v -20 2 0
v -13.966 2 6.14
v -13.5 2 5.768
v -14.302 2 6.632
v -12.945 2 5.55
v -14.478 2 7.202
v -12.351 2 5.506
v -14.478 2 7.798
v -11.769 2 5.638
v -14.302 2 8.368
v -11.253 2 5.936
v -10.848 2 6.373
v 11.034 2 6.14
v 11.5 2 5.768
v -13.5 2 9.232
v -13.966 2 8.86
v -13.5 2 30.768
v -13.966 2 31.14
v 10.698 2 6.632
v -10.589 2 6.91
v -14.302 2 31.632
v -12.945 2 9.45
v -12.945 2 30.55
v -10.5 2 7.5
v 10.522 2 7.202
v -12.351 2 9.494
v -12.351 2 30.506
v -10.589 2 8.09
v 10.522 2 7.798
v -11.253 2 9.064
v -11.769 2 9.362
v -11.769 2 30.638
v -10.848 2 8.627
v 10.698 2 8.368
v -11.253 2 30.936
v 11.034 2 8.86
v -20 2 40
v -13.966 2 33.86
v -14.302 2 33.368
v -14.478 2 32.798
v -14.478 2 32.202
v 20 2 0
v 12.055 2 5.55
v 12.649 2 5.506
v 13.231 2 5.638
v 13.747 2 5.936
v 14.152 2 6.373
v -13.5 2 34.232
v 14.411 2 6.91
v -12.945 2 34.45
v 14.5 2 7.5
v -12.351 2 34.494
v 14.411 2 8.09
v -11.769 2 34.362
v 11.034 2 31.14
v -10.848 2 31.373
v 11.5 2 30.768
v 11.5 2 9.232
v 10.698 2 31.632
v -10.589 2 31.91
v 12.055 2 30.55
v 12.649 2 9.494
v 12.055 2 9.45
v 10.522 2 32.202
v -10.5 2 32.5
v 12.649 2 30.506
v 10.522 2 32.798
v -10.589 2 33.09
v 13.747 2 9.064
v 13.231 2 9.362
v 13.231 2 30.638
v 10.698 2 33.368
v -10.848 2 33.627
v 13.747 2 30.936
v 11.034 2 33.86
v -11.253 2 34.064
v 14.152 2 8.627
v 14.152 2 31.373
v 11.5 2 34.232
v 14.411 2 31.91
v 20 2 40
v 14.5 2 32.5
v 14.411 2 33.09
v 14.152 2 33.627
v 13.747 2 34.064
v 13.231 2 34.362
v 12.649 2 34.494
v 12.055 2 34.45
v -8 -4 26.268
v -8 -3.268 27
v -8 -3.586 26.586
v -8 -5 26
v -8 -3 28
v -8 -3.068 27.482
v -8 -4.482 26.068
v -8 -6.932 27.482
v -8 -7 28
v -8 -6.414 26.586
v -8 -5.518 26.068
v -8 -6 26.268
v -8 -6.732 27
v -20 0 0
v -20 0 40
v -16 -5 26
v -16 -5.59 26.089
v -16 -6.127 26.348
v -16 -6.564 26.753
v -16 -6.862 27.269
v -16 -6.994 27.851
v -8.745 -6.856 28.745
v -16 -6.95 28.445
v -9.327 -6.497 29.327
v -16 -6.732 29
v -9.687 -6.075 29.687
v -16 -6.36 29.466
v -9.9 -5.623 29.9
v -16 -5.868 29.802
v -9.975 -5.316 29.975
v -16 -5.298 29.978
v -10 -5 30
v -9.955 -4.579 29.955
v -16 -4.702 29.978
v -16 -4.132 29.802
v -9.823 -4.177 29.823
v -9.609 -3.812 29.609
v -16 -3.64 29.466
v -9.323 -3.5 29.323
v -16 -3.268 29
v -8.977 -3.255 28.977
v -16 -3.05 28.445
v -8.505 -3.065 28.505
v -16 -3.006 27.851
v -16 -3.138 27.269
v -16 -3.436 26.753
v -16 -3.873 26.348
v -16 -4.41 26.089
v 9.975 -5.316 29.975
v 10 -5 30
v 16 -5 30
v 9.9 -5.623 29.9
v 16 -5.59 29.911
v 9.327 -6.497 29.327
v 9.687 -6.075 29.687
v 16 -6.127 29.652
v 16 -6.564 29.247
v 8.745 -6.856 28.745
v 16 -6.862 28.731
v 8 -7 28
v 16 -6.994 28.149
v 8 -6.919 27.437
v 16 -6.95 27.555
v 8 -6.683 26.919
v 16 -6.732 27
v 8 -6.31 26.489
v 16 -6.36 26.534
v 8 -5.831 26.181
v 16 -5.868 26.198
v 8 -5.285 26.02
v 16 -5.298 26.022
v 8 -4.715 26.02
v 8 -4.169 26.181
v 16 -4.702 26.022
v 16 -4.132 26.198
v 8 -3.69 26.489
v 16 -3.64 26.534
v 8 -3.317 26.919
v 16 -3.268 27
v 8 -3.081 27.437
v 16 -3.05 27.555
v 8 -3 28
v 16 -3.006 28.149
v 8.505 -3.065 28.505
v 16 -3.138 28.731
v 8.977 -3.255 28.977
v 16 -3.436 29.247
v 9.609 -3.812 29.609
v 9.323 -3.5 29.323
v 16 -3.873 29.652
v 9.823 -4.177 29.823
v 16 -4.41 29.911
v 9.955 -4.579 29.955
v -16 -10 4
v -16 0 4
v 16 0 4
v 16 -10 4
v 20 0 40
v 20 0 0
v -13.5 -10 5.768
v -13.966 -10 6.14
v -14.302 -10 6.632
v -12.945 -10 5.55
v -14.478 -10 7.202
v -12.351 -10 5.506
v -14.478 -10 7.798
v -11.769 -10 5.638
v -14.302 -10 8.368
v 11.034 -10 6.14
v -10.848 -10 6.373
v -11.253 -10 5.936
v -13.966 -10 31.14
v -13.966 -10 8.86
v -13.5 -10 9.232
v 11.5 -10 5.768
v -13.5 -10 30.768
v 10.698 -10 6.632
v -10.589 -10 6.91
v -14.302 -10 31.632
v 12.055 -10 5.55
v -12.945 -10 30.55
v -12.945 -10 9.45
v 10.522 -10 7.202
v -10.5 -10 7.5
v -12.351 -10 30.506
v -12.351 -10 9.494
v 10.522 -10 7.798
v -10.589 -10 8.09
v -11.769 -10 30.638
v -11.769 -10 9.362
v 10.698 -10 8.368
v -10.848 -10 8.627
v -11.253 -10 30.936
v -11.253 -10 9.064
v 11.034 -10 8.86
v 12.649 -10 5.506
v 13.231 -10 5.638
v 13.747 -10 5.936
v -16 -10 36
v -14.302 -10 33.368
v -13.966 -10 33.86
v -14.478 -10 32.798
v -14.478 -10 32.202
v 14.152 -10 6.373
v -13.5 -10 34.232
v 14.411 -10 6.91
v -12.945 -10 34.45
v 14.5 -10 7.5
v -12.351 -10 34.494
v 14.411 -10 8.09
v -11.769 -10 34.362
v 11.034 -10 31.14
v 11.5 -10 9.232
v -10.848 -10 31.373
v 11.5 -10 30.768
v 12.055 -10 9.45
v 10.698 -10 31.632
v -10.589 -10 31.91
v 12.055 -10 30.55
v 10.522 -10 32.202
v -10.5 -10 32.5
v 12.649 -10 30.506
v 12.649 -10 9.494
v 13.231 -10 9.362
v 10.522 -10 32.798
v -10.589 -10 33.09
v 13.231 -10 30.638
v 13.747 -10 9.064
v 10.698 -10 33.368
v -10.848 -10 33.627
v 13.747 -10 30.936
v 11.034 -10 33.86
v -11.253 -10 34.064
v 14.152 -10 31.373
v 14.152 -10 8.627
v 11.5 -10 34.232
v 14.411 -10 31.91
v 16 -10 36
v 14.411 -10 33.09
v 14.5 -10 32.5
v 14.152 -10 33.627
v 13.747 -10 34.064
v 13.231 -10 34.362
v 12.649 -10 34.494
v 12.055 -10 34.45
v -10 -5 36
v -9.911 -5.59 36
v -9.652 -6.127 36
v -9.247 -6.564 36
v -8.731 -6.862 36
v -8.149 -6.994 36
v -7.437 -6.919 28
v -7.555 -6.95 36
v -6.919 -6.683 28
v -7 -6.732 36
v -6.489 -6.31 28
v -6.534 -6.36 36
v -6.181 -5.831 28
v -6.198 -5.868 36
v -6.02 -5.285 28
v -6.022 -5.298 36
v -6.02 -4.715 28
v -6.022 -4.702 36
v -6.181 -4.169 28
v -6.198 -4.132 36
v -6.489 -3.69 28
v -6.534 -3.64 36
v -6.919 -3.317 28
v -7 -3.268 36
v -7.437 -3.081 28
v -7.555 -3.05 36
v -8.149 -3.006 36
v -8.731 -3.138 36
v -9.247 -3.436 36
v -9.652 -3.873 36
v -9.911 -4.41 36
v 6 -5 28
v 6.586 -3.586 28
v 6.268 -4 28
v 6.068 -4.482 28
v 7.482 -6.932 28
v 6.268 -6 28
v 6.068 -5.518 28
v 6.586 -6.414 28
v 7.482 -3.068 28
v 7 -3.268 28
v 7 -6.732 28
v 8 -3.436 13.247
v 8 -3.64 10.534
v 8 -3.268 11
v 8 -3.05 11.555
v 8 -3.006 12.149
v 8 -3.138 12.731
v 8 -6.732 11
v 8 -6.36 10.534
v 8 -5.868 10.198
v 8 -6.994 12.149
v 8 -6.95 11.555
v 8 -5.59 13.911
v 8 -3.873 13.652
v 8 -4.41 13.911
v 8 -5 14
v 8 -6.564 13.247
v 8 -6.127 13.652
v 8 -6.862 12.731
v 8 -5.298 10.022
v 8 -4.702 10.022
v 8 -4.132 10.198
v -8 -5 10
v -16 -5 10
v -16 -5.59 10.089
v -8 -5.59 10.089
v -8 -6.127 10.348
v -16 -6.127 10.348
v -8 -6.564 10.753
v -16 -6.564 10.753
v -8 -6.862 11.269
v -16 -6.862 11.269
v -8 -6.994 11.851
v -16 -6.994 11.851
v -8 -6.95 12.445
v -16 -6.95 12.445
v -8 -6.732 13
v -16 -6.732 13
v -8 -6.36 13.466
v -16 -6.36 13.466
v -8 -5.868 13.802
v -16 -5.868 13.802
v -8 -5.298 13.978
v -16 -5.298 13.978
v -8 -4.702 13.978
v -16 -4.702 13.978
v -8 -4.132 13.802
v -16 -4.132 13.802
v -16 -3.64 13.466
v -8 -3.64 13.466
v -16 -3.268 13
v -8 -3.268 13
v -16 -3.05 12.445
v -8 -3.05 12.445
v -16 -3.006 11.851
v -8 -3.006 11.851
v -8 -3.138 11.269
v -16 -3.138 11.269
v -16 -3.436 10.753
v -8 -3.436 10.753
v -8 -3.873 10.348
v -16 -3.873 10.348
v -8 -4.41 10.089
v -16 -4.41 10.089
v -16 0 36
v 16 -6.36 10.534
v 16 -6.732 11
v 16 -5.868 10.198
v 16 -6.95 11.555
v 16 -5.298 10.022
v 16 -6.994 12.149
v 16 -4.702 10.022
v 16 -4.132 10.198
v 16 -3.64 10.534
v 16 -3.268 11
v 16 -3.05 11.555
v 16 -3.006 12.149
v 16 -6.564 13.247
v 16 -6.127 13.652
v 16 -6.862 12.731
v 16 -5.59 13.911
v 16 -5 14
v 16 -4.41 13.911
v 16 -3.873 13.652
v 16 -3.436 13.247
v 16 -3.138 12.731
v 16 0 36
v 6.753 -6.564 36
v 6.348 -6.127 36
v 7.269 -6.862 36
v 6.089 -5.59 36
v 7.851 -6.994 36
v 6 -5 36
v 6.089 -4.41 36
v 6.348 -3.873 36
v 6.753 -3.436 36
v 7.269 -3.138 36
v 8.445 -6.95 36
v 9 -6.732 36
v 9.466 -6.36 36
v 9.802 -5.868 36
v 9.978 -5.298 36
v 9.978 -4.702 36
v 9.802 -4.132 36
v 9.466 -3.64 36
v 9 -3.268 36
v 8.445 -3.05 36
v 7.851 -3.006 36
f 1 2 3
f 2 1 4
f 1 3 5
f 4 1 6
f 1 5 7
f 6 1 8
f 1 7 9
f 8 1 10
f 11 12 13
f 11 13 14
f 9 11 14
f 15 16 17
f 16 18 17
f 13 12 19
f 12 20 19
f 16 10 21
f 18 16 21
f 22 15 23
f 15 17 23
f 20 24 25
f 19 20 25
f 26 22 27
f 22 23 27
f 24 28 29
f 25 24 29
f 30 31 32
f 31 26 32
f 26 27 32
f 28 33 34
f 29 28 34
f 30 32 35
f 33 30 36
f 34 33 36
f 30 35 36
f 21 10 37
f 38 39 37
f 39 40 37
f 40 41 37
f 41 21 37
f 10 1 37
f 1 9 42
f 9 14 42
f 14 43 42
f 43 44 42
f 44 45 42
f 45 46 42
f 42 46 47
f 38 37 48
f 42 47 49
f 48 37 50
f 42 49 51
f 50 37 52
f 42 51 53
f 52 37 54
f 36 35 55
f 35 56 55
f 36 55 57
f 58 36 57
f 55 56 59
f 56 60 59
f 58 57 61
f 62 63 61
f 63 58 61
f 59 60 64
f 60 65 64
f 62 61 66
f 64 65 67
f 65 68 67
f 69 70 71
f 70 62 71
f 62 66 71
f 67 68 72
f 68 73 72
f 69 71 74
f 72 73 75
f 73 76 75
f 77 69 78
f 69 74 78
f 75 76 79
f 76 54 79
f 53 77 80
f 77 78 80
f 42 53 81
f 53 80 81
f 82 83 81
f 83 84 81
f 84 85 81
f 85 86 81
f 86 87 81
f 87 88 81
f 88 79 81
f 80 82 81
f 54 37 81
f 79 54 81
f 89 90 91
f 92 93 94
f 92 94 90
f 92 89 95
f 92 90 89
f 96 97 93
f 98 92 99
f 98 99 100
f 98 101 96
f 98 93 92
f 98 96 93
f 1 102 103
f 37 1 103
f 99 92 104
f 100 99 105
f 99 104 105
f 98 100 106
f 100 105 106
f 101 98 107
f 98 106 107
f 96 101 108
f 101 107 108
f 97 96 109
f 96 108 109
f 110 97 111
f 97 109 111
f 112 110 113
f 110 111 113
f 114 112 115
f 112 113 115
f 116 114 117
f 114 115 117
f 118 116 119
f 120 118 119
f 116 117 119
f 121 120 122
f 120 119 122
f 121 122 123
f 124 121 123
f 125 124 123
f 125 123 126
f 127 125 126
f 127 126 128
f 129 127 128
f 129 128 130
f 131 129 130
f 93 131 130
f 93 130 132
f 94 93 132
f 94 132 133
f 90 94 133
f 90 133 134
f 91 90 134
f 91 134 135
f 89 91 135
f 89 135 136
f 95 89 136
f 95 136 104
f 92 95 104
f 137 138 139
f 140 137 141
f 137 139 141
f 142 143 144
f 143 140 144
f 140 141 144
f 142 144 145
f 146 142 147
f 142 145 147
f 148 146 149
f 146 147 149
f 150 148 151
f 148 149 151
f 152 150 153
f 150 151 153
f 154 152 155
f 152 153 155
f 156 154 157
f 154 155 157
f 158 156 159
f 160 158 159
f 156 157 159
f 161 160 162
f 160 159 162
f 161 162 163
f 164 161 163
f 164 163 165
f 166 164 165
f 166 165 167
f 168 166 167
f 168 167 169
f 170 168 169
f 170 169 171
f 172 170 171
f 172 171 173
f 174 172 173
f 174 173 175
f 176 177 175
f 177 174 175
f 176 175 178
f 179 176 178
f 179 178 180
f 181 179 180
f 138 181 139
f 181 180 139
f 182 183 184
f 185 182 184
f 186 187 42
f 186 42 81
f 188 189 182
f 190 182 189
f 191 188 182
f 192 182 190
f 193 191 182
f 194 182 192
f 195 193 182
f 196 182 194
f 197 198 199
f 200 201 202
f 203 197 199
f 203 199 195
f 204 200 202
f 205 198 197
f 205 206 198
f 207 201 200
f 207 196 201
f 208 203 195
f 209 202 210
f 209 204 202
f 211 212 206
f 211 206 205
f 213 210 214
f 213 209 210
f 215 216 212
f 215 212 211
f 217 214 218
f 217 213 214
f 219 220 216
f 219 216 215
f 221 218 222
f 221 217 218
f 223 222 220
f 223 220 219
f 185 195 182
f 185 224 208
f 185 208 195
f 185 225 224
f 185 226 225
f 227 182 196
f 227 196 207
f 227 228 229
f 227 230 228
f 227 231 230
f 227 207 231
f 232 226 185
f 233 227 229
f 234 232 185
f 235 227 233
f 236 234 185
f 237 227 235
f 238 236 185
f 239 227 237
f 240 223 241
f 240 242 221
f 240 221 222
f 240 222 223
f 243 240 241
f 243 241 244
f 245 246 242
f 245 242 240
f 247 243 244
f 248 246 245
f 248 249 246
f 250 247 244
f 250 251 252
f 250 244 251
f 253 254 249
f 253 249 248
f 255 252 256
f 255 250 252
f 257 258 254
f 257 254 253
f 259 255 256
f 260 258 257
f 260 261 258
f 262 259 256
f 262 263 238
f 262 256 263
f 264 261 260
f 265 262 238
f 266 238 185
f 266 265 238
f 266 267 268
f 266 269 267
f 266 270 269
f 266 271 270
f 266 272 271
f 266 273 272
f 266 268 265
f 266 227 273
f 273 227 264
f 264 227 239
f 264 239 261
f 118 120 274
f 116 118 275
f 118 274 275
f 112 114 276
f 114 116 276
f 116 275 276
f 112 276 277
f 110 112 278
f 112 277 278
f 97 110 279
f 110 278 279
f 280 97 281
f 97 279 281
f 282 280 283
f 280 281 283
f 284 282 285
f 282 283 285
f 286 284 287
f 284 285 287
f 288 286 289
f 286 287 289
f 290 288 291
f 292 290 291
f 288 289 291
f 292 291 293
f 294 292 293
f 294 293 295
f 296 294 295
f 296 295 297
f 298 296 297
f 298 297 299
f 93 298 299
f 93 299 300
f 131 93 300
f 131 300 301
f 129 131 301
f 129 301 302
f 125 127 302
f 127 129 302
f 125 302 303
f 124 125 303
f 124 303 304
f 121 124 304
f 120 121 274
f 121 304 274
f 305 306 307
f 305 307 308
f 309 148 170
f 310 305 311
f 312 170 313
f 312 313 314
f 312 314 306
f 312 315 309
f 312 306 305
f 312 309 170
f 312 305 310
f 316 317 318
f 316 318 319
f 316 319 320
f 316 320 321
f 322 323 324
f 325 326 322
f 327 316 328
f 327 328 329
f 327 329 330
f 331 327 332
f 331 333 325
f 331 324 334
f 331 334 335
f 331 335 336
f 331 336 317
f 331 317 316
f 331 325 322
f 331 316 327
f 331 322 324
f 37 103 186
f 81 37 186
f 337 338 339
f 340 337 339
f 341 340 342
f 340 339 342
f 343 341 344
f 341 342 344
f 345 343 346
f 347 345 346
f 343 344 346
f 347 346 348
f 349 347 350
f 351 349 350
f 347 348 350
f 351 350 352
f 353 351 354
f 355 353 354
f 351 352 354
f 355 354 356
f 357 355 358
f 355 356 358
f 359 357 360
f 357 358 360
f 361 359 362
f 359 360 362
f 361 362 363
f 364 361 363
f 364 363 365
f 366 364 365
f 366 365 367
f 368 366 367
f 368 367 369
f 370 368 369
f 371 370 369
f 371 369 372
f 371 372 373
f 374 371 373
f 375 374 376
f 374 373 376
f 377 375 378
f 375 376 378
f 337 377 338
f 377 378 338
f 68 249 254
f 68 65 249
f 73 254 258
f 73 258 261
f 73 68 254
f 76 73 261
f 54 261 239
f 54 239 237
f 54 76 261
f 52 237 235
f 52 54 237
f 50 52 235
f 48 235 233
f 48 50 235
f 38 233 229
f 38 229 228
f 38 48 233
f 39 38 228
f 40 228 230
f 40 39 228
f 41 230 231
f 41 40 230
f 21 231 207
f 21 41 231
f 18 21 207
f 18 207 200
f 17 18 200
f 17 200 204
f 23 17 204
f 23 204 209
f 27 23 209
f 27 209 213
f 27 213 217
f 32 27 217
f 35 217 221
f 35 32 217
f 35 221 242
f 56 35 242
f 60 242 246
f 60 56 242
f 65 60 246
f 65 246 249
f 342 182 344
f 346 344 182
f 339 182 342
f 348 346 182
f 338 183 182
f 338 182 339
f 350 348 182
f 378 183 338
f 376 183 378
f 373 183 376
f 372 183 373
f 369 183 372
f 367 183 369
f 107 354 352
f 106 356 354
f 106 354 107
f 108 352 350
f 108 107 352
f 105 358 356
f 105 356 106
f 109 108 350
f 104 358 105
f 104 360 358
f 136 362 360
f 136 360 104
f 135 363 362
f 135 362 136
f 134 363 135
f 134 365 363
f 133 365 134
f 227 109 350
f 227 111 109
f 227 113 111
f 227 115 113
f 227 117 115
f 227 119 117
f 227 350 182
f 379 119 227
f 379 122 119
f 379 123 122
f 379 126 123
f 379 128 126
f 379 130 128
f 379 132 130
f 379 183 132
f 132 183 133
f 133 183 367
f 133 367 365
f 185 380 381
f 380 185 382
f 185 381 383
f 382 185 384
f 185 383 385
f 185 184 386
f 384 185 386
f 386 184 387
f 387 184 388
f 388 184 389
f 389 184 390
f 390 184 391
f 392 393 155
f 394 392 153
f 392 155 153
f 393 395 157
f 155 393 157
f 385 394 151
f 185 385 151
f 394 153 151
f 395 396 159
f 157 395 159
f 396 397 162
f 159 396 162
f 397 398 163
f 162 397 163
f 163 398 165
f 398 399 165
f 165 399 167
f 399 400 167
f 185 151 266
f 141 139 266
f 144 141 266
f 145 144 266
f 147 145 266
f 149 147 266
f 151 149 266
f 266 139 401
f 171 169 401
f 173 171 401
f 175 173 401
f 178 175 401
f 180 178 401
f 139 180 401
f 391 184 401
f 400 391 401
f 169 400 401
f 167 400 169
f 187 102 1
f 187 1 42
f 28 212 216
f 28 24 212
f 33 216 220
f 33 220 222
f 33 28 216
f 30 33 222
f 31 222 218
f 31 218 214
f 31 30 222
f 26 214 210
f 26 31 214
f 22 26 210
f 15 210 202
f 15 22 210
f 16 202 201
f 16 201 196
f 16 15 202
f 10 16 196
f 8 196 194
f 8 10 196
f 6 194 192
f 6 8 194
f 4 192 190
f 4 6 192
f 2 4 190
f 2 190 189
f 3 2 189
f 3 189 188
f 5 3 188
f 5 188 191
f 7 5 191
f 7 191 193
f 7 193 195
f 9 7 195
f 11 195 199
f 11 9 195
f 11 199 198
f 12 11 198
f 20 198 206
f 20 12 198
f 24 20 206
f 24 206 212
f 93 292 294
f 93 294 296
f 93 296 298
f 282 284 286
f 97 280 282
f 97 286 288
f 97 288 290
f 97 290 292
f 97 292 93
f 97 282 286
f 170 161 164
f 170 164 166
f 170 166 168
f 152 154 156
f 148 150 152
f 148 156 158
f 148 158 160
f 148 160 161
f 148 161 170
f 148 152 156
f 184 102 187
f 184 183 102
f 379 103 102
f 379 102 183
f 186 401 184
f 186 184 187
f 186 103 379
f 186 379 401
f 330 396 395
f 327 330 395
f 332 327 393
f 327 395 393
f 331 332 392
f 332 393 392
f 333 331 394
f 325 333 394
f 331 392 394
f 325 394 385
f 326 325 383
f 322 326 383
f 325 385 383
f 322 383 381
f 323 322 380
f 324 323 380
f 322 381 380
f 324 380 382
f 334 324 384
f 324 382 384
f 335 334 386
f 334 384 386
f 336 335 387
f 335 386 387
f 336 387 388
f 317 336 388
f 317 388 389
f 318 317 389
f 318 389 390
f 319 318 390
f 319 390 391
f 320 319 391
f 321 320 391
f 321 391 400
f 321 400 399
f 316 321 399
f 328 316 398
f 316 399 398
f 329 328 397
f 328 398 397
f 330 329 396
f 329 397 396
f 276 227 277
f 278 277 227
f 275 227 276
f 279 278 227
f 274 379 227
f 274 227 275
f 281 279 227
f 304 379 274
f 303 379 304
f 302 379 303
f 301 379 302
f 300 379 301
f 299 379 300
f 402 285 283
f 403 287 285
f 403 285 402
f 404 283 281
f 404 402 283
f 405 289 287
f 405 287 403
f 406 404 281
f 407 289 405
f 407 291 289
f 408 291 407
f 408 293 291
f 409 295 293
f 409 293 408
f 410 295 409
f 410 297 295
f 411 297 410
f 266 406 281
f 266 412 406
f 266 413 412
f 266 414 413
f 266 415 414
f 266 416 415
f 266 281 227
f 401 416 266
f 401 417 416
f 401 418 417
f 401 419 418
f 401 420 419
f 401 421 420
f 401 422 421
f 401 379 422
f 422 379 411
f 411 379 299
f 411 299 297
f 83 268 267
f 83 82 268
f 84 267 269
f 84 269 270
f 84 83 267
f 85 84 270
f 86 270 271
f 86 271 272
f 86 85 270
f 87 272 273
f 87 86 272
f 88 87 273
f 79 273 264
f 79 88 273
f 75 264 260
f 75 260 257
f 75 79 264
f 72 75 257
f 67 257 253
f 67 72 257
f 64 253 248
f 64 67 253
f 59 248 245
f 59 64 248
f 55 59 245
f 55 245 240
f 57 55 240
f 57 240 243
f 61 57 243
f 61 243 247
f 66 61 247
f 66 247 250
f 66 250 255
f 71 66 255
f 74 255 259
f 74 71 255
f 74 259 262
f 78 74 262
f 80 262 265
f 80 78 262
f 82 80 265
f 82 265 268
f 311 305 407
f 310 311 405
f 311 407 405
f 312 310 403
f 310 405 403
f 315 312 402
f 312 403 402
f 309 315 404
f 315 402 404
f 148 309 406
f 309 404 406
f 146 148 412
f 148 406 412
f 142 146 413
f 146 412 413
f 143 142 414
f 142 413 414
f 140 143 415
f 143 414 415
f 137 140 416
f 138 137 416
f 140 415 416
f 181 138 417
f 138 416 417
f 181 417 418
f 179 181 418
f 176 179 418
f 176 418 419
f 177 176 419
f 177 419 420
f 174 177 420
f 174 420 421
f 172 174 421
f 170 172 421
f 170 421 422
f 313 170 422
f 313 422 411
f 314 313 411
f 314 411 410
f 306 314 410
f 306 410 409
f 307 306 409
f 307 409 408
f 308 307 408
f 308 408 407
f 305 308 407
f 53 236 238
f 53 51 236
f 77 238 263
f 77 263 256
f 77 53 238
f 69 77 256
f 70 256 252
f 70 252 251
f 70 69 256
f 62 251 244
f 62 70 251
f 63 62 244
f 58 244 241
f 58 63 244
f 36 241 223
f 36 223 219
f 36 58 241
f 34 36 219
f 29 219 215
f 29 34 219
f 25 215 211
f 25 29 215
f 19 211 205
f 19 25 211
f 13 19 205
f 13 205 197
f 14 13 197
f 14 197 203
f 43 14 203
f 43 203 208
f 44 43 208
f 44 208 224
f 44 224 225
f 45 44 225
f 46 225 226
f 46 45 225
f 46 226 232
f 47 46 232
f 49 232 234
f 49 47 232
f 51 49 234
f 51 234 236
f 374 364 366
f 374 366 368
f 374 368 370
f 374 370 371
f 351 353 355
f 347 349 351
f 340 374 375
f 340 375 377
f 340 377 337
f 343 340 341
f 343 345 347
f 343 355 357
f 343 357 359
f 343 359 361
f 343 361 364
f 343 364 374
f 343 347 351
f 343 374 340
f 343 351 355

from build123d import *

# Parameters (mm, degrees)
SKETCH032_W     = 40
SKETCH032_H     = 40
SKETCH032_R     = 2
PAD018_DEPTH    = 2
SKETCH033_W     = 32
SKETCH033_H     = 32
SKETCH033_R     = 2
PAD019_DEPTH    = 10
SKETCH034_R     = 2
POCKET013_DEPTH = 8
SKETCH035_R     = 2
POCKET014_DEPTH = 8
SKETCH039_R     = 2
POCKET015_DEPTH = 8


with BuildPart() as part:
    # Sketch032 → Pad018 (new body)
    with BuildSketch(Plane.XZ):
        with Locations((0, 20)):
            Rectangle(SKETCH032_W, SKETCH032_H)
        with Locations((-12.5, 7.5)):
            Circle(SKETCH032_R, mode=Mode.SUBTRACT)
        with Locations((-12.5, 32.5)):
            Circle(SKETCH032_R, mode=Mode.SUBTRACT)
        with Locations((12.5, 32.5)):
            Circle(SKETCH032_R, mode=Mode.SUBTRACT)
        with Locations((12.5, 7.5)):
            Circle(SKETCH032_R, mode=Mode.SUBTRACT)
    extrude(amount=-PAD018_DEPTH)

    # Sketch033 (on Face9 of Pad018) → Pad019 (join)
    with BuildSketch(Plane.XZ):
        with Locations((0, 20)):
            Rectangle(SKETCH033_W, SKETCH033_H)
        with Locations((-12.5, 32.5)):
            Circle(SKETCH033_R, mode=Mode.SUBTRACT)
        with Locations((12.5, 32.5)):
            Circle(SKETCH033_R, mode=Mode.SUBTRACT)
        with Locations((-12.5, 7.5)):
            Circle(SKETCH033_R, mode=Mode.SUBTRACT)
        with Locations((12.5, 7.5)):
            Circle(SKETCH033_R, mode=Mode.SUBTRACT)
    extrude(amount=PAD019_DEPTH)

    # Sketch034 (on Face10 of Pad019) → Pocket013 (cut)
    with BuildSketch(Plane(origin=(-16, 0, 0), x_dir=(0, 0, -1), z_dir=(-1, 0, 0))):
        with Locations((-28, 5)):
            Circle(SKETCH034_R)
        with Locations((-12, 5)):
            Circle(SKETCH034_R)
    extrude(amount=-POCKET013_DEPTH, mode=Mode.SUBTRACT)

    # Sketch035 (on Face7 of Pocket013) → Pocket014 (cut)
    with BuildSketch(Plane(origin=(0, 0, 36), x_dir=(-1, 0, 0), z_dir=(0, 0, 1))):
        with Locations((-8, 5)):
            Circle(SKETCH035_R)
        with Locations((8, 5)):
            Circle(SKETCH035_R)
    extrude(amount=-POCKET014_DEPTH, mode=Mode.SUBTRACT)

    # Sketch039 (on Face8 of Pocket014) → Pocket015 (cut)
    with BuildSketch(Plane(origin=(16, 0, 0), x_dir=(0, 0, 1), z_dir=(1, 0, 0))):
        with Locations((12, 5)):
            Circle(SKETCH039_R)
        with Locations((28, 5)):
            Circle(SKETCH039_R)
    extrude(amount=-POCKET015_DEPTH, mode=Mode.SUBTRACT)


solid = part.part
